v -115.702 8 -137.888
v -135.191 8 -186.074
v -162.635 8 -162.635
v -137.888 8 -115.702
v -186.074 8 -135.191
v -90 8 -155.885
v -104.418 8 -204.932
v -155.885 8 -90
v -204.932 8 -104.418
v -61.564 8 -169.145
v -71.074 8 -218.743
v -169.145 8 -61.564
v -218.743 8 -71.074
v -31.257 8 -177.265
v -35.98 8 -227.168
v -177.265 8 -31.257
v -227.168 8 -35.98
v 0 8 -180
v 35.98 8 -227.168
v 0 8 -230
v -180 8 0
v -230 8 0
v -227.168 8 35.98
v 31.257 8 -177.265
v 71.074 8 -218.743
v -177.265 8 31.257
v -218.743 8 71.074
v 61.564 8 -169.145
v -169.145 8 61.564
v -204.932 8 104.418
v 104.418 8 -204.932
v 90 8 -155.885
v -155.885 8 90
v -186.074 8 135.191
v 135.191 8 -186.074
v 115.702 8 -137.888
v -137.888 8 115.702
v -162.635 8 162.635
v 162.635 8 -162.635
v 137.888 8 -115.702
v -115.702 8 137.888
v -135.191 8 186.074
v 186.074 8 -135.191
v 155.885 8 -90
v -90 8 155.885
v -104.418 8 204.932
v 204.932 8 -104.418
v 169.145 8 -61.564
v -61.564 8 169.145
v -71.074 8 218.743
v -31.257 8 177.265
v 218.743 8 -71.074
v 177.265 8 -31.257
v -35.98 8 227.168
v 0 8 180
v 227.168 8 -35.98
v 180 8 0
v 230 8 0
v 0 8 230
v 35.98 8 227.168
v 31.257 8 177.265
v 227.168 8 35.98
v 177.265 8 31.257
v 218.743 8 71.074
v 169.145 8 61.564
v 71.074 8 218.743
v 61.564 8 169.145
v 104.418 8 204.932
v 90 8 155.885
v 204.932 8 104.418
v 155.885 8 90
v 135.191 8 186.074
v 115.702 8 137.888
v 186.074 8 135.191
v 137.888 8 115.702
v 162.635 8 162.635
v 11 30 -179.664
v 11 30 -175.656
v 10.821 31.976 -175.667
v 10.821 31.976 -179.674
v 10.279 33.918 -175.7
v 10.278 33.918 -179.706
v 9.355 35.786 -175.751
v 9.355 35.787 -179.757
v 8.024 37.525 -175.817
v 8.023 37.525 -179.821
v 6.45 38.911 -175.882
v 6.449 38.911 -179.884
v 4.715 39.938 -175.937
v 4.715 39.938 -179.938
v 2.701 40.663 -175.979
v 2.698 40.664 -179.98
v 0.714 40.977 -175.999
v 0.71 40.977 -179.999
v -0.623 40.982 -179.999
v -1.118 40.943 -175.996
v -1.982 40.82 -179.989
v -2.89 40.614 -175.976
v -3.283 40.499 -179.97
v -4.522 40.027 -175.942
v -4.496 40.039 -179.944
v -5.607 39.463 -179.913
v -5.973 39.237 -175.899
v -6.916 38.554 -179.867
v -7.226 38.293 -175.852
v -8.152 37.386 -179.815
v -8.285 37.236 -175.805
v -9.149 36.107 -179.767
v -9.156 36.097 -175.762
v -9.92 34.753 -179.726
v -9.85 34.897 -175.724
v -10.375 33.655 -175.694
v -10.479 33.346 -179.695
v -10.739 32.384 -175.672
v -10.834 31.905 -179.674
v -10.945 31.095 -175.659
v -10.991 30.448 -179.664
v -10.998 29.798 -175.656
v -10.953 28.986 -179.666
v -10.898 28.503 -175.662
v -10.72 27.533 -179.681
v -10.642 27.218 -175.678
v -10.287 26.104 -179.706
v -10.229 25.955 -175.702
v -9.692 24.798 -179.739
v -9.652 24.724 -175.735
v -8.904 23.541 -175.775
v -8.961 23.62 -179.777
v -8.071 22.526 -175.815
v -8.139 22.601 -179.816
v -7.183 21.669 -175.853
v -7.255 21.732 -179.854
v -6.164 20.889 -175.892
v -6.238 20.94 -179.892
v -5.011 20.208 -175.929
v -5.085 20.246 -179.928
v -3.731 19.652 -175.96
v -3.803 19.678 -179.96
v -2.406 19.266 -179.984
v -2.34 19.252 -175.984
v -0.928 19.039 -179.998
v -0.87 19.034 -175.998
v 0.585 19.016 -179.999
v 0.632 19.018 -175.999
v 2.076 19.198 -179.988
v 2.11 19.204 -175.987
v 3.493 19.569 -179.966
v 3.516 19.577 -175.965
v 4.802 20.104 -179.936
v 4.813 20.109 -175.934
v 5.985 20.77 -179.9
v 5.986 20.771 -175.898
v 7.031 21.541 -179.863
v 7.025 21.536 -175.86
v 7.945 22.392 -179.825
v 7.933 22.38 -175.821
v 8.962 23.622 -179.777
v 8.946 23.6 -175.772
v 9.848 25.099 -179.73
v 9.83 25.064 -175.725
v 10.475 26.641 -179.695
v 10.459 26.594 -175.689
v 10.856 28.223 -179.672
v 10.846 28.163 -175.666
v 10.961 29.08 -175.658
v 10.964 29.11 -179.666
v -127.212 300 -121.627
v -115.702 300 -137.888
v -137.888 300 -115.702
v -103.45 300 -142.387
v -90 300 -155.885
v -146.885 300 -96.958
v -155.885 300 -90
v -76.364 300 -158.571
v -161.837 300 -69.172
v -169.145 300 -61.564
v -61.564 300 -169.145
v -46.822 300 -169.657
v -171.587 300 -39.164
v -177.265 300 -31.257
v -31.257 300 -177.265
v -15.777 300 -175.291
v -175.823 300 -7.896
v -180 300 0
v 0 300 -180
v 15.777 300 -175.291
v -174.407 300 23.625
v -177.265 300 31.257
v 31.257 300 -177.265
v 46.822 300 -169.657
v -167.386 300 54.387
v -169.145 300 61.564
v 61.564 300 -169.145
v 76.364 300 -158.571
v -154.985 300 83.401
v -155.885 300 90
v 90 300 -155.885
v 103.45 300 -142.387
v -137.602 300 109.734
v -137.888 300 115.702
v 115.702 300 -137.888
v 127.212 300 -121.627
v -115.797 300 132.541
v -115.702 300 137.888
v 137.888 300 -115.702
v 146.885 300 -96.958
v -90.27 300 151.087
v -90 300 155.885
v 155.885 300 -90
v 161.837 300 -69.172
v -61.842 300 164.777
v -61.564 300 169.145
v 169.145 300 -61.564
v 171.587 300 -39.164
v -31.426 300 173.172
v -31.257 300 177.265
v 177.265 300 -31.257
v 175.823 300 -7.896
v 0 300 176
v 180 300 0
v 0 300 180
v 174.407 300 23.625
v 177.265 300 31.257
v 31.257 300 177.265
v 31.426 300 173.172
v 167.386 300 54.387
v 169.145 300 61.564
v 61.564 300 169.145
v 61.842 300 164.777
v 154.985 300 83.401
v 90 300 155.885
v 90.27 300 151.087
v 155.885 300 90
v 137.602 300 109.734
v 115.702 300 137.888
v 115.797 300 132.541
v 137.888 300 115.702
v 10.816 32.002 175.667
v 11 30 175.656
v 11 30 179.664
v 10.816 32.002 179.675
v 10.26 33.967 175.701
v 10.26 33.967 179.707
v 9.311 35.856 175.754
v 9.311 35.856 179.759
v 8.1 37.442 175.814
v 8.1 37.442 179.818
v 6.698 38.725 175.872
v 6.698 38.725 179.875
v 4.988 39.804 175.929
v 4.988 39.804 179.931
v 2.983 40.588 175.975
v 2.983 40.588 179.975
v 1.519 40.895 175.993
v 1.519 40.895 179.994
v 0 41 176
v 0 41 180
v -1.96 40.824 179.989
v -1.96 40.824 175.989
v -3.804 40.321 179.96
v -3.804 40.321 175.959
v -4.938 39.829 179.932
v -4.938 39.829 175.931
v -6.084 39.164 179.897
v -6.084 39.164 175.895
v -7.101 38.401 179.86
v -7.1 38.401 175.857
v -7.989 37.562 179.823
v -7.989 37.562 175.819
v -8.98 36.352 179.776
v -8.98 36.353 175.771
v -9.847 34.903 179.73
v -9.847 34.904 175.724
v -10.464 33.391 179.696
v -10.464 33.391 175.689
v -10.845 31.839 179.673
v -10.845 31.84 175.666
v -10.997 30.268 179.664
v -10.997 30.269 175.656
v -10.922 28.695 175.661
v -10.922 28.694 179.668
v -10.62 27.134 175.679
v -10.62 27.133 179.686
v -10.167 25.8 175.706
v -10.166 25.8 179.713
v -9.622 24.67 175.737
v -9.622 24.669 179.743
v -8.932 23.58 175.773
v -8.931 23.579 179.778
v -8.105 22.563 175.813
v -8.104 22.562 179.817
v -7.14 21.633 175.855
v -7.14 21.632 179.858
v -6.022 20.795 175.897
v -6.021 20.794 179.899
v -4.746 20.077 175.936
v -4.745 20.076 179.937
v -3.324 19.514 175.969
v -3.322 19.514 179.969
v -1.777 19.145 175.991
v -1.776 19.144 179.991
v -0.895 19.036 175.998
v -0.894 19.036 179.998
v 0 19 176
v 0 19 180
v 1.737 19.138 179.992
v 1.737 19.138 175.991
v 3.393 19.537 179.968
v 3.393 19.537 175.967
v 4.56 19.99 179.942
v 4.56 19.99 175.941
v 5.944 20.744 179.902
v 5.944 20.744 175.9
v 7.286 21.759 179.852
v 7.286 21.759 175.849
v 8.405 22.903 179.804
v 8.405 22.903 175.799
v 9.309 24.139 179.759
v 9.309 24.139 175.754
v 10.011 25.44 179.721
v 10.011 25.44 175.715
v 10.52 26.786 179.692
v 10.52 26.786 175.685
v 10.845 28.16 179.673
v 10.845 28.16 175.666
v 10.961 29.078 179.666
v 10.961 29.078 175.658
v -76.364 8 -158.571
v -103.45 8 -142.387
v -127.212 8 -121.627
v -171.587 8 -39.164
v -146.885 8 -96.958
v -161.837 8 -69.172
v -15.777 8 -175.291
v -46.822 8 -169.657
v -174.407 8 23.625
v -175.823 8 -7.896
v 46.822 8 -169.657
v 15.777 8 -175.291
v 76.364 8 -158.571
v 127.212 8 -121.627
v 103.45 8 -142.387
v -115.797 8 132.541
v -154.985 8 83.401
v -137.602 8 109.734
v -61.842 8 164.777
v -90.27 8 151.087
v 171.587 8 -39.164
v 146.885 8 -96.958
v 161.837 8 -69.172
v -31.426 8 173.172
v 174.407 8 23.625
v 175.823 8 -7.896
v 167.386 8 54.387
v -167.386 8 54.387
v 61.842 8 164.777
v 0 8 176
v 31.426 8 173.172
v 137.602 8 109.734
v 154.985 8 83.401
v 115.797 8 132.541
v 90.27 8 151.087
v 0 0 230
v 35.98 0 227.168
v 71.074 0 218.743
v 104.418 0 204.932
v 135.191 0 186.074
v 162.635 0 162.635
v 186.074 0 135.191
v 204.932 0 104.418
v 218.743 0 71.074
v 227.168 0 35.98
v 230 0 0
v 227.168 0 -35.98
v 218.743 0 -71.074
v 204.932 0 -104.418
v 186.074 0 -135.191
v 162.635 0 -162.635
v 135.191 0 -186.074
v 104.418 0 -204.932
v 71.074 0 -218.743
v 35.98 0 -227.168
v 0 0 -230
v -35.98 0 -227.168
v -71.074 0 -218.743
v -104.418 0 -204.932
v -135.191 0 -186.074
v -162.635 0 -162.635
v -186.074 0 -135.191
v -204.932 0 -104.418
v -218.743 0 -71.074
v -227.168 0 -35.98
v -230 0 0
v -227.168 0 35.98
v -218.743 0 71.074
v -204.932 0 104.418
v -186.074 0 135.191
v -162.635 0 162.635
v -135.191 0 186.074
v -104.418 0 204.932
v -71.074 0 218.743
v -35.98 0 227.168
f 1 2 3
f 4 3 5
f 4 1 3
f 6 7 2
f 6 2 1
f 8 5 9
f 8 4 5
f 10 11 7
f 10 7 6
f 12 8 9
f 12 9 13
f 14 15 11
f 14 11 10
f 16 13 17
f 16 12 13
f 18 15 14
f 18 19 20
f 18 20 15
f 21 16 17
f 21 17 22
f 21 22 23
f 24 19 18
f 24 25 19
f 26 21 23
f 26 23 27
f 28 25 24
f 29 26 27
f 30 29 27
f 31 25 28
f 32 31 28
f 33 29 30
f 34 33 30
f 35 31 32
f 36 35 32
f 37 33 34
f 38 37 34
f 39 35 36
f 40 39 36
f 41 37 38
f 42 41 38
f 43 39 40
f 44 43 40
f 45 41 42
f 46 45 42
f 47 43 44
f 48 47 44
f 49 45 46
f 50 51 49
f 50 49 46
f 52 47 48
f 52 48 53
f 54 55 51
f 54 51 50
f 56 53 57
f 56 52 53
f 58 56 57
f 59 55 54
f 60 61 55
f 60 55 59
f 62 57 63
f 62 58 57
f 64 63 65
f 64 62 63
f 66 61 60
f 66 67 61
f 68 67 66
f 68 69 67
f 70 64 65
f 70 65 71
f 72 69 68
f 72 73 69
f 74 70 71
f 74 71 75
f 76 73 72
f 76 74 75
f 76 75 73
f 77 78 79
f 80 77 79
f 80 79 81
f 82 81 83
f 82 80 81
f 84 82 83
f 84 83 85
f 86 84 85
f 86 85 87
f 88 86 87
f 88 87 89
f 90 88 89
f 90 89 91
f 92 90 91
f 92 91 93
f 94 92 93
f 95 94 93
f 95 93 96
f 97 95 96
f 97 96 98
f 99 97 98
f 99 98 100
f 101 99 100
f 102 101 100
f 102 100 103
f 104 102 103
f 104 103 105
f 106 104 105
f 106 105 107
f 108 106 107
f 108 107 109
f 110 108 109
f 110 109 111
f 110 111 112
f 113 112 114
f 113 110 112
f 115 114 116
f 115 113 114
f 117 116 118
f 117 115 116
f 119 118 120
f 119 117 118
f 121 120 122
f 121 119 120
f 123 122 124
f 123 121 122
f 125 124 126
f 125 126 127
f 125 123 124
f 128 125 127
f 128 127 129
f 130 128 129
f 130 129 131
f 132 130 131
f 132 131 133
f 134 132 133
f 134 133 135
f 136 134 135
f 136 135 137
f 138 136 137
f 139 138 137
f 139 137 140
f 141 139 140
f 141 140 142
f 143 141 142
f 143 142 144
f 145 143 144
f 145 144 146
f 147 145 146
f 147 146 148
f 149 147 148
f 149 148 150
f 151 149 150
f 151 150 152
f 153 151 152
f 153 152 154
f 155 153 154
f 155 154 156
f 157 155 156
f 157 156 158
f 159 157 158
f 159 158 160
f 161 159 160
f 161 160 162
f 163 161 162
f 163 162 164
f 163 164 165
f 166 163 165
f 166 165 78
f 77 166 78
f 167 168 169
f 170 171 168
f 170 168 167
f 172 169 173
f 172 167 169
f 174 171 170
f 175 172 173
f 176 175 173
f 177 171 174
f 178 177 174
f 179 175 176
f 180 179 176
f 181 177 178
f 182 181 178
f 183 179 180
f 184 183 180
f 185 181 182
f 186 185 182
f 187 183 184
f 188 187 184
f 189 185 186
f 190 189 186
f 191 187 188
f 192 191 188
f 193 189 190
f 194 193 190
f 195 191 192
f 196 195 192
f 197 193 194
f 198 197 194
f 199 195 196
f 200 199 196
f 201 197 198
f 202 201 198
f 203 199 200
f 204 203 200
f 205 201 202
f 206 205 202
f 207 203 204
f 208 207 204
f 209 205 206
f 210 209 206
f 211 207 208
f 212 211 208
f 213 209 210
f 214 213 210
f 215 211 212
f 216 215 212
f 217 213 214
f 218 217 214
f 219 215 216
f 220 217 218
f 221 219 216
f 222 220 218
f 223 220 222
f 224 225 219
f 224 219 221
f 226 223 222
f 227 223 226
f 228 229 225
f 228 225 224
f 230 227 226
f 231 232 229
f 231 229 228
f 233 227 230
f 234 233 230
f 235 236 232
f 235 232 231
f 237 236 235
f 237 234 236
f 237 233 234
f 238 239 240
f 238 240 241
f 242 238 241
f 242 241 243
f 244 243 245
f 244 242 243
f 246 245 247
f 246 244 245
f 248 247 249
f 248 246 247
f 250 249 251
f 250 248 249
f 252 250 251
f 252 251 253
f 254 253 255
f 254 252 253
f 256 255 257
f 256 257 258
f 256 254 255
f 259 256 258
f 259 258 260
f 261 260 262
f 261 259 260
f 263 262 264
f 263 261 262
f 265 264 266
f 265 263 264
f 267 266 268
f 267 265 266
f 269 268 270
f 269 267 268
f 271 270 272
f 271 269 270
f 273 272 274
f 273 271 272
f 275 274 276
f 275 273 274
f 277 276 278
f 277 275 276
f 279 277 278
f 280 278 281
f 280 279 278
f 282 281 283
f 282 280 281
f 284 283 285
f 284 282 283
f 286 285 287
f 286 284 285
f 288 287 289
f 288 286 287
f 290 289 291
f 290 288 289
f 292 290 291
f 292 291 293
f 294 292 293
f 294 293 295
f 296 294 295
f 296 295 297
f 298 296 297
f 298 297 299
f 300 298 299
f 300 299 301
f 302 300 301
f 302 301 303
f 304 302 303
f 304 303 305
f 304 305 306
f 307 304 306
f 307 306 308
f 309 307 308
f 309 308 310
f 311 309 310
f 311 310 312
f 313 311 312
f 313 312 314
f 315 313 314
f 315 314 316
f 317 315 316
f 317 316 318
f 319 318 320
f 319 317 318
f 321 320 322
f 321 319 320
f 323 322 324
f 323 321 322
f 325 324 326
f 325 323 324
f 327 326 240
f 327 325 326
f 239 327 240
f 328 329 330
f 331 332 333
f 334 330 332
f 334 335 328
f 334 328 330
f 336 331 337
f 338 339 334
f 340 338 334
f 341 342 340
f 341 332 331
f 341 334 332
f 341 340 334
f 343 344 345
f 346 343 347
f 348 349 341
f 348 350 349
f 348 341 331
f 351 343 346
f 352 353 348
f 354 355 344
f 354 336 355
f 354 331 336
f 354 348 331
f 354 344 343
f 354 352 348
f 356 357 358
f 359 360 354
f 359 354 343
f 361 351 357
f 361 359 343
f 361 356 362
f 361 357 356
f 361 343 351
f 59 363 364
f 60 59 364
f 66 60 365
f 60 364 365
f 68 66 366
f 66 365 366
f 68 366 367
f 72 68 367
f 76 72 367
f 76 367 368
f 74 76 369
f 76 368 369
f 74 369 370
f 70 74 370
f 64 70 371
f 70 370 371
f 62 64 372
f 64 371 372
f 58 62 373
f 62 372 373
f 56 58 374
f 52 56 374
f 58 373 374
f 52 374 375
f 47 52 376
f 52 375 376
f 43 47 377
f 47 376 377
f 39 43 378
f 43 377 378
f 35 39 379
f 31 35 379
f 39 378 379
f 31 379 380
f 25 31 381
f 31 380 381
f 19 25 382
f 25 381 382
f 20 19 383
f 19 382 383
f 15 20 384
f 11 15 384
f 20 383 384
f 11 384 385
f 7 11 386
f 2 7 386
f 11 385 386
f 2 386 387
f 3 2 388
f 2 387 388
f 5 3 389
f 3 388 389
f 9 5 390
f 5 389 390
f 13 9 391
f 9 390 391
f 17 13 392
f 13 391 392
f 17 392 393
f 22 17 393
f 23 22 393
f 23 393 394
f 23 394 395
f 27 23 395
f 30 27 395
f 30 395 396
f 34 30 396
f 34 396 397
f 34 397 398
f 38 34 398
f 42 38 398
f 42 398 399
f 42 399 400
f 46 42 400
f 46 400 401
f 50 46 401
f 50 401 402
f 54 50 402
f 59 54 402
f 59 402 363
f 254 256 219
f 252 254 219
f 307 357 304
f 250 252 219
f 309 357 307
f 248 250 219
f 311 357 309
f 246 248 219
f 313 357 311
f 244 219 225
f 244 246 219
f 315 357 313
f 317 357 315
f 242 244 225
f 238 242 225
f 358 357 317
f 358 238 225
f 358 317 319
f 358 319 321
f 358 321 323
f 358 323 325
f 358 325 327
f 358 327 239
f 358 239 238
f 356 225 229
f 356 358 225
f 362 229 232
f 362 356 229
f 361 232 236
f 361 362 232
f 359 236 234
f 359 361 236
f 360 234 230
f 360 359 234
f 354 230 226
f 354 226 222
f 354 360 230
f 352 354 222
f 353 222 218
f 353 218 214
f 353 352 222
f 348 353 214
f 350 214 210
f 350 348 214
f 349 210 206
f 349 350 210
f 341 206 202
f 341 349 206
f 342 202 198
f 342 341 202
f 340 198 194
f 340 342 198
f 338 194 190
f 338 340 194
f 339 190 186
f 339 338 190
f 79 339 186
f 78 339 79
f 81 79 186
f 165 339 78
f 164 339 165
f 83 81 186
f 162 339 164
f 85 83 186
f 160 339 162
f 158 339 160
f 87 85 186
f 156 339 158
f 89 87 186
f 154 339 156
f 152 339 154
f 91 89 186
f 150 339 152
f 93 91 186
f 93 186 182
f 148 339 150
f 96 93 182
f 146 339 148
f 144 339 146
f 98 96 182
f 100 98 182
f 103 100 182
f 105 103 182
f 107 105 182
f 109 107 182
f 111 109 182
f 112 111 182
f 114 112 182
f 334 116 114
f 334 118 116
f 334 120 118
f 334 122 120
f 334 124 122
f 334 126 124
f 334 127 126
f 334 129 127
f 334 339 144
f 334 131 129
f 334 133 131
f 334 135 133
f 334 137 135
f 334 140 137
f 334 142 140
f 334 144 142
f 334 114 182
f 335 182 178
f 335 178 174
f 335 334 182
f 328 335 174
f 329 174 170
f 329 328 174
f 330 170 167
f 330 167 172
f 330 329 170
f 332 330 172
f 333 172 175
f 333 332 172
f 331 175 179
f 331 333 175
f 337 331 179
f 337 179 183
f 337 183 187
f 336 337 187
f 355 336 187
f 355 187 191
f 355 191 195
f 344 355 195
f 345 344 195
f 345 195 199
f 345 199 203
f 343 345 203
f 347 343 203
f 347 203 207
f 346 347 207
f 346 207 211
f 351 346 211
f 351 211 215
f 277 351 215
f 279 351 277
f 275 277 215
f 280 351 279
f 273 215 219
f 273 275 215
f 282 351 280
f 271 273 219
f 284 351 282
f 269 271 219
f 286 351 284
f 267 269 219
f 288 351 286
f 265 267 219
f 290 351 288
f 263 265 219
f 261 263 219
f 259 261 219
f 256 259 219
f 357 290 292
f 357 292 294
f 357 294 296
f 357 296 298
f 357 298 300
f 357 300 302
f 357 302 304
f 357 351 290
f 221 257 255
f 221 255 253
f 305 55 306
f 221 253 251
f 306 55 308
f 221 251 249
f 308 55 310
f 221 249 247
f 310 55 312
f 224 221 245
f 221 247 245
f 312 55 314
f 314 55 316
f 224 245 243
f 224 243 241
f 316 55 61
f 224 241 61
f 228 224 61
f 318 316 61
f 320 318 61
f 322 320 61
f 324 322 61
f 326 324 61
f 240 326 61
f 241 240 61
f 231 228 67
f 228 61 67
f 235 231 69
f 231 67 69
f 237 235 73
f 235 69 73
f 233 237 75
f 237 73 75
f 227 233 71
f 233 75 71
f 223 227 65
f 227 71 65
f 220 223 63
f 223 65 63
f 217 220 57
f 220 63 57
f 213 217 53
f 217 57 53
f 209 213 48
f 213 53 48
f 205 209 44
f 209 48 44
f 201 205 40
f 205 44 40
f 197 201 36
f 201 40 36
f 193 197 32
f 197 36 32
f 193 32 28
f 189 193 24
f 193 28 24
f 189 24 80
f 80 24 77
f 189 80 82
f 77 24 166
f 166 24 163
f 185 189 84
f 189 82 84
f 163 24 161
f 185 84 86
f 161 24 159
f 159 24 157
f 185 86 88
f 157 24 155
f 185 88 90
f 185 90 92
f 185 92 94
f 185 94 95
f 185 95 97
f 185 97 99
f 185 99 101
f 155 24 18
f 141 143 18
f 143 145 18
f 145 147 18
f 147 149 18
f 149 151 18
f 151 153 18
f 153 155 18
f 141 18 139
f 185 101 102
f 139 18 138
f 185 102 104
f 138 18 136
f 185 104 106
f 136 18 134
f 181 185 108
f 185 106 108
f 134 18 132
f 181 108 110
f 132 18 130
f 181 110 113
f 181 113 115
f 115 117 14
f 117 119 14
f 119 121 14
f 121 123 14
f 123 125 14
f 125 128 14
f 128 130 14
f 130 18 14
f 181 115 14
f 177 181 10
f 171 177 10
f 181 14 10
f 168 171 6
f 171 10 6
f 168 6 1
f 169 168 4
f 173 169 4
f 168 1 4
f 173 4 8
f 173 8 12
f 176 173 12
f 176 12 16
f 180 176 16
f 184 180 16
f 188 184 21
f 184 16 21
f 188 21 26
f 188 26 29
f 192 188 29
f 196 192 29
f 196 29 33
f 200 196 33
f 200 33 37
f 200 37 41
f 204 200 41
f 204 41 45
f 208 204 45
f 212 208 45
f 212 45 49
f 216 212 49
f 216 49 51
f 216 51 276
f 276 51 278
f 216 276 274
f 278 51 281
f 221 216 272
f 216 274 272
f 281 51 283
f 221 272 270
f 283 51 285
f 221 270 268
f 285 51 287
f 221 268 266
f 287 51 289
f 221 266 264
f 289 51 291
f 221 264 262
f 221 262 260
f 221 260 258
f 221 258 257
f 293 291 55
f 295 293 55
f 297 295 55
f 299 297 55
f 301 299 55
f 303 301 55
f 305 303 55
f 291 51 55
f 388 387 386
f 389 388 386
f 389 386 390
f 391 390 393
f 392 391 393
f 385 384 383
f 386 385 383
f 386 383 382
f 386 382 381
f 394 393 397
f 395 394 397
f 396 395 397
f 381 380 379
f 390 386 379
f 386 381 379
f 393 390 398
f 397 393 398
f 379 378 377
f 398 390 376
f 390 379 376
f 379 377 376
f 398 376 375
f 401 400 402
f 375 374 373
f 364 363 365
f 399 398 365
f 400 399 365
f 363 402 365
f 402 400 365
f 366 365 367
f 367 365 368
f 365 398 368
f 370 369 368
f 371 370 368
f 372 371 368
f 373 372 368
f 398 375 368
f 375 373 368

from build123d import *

# Parameters (mm, degrees)
BASE_FLANGE_SKETCH_R       = 230
BASE_FLANGE_DEPTH          = 8
TANK_WALL_SKETCH_R         = 180
TANK_WALL_SKETCH_R_2       = 176
TANK_WALL_DEPTH            = 300
TAP_DRAIN_PORTS_DEPTH      = 443.492937797
TAP_DRAIN_PORTS_DEPTH_BACK = 443.492937797
PORT_HOLES_SKETCH_R        = 11


with BuildPart() as part:
    # Base Flange Sketch → Base Flange (new body)
    with BuildSketch(Plane(origin=(0, 0, 0), x_dir=(1, 0, 0), z_dir=(0, 1, 0))):
        with Locations(Location((0, 0, 0), (0, 0, 270))):
            Circle(BASE_FLANGE_SKETCH_R)
    extrude(amount=BASE_FLANGE_DEPTH)

    # Tank Wall Sketch → Tank Wall (add)
    with BuildSketch(Plane(origin=(0, 0, 0), x_dir=(1, 0, 0), z_dir=(0, 1, 0))):
        with Locations(Location((0, 0, 0), (0, 0, 270))):
            Circle(TANK_WALL_SKETCH_R)
        with Locations(Location((0, 0, 0), (0, 0, 270))):
            Circle(TANK_WALL_SKETCH_R_2, mode=Mode.SUBTRACT)
    extrude(amount=TANK_WALL_DEPTH)

    # Port Holes Sketch → Tap + Drain Ports (cut, two sides: drawn at the far end of the back side and taken through both)
    with BuildSketch(Plane.XY.offset(-TAP_DRAIN_PORTS_DEPTH_BACK)):
        with Locations((0, 30)):
            Circle(PORT_HOLES_SKETCH_R)
    extrude(amount=TAP_DRAIN_PORTS_DEPTH + TAP_DRAIN_PORTS_DEPTH_BACK, mode=Mode.SUBTRACT)


solid = part.part
